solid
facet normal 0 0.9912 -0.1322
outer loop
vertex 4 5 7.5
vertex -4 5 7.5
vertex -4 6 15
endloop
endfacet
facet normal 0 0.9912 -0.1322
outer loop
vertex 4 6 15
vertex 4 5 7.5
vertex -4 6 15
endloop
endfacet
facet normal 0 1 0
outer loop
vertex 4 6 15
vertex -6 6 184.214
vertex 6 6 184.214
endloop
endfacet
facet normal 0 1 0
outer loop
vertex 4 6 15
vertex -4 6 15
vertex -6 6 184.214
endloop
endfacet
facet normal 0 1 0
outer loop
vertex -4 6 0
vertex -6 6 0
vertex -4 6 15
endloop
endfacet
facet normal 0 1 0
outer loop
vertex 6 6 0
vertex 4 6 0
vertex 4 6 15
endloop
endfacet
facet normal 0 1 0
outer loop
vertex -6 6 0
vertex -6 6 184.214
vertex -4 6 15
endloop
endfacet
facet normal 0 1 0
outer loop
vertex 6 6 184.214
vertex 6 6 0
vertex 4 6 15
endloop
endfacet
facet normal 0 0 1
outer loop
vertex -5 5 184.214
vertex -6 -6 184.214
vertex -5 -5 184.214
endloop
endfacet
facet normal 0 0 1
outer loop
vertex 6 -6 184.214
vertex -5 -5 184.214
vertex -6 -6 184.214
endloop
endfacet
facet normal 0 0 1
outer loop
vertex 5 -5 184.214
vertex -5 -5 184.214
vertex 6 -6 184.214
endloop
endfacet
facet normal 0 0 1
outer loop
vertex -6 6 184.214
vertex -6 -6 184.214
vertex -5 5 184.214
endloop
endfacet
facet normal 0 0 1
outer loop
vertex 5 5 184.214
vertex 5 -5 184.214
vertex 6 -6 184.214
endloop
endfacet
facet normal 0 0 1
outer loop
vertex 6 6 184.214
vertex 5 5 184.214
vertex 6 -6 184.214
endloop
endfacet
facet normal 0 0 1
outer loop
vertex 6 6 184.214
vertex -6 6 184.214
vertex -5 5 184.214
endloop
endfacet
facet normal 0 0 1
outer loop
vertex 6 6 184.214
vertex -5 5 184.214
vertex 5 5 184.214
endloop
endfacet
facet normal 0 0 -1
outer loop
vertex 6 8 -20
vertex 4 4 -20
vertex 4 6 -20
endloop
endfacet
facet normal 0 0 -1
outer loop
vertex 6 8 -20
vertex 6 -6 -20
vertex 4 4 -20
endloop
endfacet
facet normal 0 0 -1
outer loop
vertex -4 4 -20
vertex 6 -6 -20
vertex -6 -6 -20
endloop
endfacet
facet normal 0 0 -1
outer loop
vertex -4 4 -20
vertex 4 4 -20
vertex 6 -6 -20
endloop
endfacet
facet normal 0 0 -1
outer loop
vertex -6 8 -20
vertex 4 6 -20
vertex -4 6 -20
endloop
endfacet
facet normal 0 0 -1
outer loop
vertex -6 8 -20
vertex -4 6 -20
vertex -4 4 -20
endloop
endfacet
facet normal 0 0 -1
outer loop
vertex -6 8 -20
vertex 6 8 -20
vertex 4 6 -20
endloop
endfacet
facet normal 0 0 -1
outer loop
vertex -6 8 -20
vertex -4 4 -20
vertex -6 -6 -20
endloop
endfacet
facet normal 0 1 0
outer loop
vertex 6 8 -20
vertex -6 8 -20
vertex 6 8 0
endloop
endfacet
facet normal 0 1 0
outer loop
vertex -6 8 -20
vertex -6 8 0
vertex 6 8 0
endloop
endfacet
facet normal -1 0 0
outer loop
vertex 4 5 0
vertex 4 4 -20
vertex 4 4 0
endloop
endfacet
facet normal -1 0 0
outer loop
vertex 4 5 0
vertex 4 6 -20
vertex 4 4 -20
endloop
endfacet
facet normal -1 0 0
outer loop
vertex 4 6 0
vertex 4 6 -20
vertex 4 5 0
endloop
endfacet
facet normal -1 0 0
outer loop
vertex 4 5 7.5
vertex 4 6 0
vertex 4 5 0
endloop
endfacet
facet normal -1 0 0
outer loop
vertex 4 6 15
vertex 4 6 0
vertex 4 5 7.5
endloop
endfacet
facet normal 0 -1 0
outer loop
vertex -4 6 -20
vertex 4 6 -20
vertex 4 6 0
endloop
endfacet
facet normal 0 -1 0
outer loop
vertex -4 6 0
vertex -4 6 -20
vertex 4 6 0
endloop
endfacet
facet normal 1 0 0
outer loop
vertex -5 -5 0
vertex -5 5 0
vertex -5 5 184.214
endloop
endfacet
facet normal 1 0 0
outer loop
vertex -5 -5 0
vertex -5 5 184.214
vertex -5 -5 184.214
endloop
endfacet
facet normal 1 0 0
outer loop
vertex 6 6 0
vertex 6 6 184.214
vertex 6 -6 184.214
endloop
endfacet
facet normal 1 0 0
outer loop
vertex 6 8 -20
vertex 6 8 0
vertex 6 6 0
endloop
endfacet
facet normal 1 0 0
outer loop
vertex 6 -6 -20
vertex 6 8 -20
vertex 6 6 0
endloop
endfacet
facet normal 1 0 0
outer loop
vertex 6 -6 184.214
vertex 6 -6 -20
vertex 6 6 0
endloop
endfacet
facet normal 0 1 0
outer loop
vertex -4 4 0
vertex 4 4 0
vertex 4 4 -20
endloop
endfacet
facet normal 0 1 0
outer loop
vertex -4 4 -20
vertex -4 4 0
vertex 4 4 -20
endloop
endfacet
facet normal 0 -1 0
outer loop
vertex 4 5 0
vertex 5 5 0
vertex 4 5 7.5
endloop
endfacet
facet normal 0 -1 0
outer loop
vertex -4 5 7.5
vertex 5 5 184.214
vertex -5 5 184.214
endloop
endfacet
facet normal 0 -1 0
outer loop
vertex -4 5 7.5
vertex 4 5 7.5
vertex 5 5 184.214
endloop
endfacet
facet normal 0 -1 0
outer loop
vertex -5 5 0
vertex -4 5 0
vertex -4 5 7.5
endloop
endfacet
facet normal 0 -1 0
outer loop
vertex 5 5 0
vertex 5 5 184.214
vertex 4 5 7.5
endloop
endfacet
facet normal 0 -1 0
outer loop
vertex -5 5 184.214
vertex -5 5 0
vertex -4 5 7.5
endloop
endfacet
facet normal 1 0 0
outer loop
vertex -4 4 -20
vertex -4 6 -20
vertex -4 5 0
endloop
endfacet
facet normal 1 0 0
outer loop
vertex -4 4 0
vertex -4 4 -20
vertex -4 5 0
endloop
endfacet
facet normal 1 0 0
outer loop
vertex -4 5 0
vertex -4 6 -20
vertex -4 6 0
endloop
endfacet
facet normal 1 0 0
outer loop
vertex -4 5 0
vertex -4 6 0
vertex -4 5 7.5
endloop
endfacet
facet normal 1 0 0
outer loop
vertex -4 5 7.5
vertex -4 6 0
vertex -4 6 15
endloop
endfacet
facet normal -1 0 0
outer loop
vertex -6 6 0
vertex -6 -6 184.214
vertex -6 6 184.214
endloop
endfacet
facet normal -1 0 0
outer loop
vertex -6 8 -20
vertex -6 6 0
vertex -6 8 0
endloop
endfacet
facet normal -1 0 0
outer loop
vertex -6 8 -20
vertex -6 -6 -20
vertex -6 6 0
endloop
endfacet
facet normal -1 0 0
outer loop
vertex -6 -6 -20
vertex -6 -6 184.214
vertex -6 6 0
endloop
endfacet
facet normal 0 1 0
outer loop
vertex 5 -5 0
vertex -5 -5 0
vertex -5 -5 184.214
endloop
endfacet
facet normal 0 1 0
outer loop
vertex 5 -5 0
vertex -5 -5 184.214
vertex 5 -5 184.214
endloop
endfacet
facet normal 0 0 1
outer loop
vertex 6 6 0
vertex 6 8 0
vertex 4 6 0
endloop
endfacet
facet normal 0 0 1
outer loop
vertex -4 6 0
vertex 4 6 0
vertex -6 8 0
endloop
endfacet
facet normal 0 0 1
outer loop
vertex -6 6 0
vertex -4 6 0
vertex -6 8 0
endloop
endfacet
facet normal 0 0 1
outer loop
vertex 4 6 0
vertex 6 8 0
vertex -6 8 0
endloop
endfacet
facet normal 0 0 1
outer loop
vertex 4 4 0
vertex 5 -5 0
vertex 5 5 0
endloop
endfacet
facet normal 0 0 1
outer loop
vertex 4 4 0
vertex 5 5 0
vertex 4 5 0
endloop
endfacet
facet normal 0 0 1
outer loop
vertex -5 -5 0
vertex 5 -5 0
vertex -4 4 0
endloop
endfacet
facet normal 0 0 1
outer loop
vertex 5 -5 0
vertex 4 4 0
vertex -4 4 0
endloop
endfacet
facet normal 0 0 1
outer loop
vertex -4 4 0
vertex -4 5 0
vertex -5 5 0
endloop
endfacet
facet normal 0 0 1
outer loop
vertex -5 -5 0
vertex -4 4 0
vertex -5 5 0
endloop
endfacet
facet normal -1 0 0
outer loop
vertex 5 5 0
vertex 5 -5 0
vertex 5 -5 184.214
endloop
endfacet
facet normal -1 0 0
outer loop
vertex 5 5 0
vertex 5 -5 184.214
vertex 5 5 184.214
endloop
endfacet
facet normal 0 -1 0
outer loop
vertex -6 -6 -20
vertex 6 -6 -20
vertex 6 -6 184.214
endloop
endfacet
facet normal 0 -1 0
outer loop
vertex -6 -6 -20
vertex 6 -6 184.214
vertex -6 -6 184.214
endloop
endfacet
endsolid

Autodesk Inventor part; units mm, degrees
ref_plane "YZ Plane" through (0, 0, 0) normal (1, 0, 0) x (0, 1, 0)
ref_plane "XZ Plane" through (0, 0, 0) normal (0, 1, 0) x (-1, 0, 0)
sketch "Tube Base Sketch" plane through (0, 0, 0) normal (0, 0, 1) x (1, 0, 0)
  line L0 (-5, -5) -> (5, -5)
  line L1 (5, -5) -> (5, 5)
  line L2 (5, 5) -> (-5, 5)
  line L3 (-5, 5) -> (-5, -5)
  line L4 (-5, -5) -> (5, 5) construction
  line L5 (5, -5) -> (-5, 5) construction
  line L6 (-6, 6) -> (6, 6)
  line L7 (6, 6) -> (6, -6)
  line L8 (6, -6) -> (-6, -6)
  line L9 (-6, -6) -> (-6, 6)
  point P0 (0, 0)
  dimension "TubeWidth" = 10
  dimension "TubeHeight" = 10
  dimension "WallThickness" = 1
extrude "Tube" add sketch "Tube Base Sketch" along normal blind 184.2137
sketch "Cap Sketch" plane through (0, 0, 0) normal (0, 0, -1) x (-1, 0, 0)
  line L0 (-6, -6) -> (6, -6)
  line L1 (6, -6) -> (6, 8)
  line L2 (6, 8) -> (-6, 8)
  line L3 (-6, 8) -> (-6, -6)
  point P0 (0, 0)
  dimension "CapHeight" = 14
extrude "Extrusion6" add sketch "Cap Sketch" along normal blind 20
ref_plane "Work Plane1" through (0, -6, 184.2137) normal (-1, 0, 0) x (0, 0, 1)
sketch "Edge Cut and Slit Sketch" plane through (0, -6, 184.2137) normal (-1, 0, 0) x (0, 0, 1)
  line L0 (-184.2137, 12) -> (0, 12) projected
  line L1 (-184.2137, 11) -> (-184.2137, 1) construction
  line L2 (-184.2137, 12) -> (-184.2137, 10) construction
  line L3 (-184.2137, 10) -> (-169.2137, 12)
  line L4 (-204.2137, 0) -> (-204.2137, 14) projected
  line L5 (-184.2137, 12) -> (-204.2137, 12)
  line L6 (-184.2137, 10) -> (-204.2137, 10)
  point P0 (-184.2137, 6)
  dimension "EdgeCutDepth" = 2
  dimension "EdgeCutLength" = 15
extrude "Edge Cut and Slit" cut sketch "Edge Cut and Slit Sketch" along normal mid plane 8
equation "\"TubeWidth\" = MaxWidth"
equation "\"TubeHeight\" = TubeWidth"
equation "\"TubeLength\" = DesiredLength + PlugLength"
equation "\"EdgeCutDepth\" = 2 * WallThickness"
equation "\"d26\" = TubeWidth - 2 * WallThickness"
equation "\"MaxWidth\" = 10"
equation "\"DesiredLength\" = 164.21369"
equation "\"PlugLength\" = 20"
properties part number "Whistle1"
